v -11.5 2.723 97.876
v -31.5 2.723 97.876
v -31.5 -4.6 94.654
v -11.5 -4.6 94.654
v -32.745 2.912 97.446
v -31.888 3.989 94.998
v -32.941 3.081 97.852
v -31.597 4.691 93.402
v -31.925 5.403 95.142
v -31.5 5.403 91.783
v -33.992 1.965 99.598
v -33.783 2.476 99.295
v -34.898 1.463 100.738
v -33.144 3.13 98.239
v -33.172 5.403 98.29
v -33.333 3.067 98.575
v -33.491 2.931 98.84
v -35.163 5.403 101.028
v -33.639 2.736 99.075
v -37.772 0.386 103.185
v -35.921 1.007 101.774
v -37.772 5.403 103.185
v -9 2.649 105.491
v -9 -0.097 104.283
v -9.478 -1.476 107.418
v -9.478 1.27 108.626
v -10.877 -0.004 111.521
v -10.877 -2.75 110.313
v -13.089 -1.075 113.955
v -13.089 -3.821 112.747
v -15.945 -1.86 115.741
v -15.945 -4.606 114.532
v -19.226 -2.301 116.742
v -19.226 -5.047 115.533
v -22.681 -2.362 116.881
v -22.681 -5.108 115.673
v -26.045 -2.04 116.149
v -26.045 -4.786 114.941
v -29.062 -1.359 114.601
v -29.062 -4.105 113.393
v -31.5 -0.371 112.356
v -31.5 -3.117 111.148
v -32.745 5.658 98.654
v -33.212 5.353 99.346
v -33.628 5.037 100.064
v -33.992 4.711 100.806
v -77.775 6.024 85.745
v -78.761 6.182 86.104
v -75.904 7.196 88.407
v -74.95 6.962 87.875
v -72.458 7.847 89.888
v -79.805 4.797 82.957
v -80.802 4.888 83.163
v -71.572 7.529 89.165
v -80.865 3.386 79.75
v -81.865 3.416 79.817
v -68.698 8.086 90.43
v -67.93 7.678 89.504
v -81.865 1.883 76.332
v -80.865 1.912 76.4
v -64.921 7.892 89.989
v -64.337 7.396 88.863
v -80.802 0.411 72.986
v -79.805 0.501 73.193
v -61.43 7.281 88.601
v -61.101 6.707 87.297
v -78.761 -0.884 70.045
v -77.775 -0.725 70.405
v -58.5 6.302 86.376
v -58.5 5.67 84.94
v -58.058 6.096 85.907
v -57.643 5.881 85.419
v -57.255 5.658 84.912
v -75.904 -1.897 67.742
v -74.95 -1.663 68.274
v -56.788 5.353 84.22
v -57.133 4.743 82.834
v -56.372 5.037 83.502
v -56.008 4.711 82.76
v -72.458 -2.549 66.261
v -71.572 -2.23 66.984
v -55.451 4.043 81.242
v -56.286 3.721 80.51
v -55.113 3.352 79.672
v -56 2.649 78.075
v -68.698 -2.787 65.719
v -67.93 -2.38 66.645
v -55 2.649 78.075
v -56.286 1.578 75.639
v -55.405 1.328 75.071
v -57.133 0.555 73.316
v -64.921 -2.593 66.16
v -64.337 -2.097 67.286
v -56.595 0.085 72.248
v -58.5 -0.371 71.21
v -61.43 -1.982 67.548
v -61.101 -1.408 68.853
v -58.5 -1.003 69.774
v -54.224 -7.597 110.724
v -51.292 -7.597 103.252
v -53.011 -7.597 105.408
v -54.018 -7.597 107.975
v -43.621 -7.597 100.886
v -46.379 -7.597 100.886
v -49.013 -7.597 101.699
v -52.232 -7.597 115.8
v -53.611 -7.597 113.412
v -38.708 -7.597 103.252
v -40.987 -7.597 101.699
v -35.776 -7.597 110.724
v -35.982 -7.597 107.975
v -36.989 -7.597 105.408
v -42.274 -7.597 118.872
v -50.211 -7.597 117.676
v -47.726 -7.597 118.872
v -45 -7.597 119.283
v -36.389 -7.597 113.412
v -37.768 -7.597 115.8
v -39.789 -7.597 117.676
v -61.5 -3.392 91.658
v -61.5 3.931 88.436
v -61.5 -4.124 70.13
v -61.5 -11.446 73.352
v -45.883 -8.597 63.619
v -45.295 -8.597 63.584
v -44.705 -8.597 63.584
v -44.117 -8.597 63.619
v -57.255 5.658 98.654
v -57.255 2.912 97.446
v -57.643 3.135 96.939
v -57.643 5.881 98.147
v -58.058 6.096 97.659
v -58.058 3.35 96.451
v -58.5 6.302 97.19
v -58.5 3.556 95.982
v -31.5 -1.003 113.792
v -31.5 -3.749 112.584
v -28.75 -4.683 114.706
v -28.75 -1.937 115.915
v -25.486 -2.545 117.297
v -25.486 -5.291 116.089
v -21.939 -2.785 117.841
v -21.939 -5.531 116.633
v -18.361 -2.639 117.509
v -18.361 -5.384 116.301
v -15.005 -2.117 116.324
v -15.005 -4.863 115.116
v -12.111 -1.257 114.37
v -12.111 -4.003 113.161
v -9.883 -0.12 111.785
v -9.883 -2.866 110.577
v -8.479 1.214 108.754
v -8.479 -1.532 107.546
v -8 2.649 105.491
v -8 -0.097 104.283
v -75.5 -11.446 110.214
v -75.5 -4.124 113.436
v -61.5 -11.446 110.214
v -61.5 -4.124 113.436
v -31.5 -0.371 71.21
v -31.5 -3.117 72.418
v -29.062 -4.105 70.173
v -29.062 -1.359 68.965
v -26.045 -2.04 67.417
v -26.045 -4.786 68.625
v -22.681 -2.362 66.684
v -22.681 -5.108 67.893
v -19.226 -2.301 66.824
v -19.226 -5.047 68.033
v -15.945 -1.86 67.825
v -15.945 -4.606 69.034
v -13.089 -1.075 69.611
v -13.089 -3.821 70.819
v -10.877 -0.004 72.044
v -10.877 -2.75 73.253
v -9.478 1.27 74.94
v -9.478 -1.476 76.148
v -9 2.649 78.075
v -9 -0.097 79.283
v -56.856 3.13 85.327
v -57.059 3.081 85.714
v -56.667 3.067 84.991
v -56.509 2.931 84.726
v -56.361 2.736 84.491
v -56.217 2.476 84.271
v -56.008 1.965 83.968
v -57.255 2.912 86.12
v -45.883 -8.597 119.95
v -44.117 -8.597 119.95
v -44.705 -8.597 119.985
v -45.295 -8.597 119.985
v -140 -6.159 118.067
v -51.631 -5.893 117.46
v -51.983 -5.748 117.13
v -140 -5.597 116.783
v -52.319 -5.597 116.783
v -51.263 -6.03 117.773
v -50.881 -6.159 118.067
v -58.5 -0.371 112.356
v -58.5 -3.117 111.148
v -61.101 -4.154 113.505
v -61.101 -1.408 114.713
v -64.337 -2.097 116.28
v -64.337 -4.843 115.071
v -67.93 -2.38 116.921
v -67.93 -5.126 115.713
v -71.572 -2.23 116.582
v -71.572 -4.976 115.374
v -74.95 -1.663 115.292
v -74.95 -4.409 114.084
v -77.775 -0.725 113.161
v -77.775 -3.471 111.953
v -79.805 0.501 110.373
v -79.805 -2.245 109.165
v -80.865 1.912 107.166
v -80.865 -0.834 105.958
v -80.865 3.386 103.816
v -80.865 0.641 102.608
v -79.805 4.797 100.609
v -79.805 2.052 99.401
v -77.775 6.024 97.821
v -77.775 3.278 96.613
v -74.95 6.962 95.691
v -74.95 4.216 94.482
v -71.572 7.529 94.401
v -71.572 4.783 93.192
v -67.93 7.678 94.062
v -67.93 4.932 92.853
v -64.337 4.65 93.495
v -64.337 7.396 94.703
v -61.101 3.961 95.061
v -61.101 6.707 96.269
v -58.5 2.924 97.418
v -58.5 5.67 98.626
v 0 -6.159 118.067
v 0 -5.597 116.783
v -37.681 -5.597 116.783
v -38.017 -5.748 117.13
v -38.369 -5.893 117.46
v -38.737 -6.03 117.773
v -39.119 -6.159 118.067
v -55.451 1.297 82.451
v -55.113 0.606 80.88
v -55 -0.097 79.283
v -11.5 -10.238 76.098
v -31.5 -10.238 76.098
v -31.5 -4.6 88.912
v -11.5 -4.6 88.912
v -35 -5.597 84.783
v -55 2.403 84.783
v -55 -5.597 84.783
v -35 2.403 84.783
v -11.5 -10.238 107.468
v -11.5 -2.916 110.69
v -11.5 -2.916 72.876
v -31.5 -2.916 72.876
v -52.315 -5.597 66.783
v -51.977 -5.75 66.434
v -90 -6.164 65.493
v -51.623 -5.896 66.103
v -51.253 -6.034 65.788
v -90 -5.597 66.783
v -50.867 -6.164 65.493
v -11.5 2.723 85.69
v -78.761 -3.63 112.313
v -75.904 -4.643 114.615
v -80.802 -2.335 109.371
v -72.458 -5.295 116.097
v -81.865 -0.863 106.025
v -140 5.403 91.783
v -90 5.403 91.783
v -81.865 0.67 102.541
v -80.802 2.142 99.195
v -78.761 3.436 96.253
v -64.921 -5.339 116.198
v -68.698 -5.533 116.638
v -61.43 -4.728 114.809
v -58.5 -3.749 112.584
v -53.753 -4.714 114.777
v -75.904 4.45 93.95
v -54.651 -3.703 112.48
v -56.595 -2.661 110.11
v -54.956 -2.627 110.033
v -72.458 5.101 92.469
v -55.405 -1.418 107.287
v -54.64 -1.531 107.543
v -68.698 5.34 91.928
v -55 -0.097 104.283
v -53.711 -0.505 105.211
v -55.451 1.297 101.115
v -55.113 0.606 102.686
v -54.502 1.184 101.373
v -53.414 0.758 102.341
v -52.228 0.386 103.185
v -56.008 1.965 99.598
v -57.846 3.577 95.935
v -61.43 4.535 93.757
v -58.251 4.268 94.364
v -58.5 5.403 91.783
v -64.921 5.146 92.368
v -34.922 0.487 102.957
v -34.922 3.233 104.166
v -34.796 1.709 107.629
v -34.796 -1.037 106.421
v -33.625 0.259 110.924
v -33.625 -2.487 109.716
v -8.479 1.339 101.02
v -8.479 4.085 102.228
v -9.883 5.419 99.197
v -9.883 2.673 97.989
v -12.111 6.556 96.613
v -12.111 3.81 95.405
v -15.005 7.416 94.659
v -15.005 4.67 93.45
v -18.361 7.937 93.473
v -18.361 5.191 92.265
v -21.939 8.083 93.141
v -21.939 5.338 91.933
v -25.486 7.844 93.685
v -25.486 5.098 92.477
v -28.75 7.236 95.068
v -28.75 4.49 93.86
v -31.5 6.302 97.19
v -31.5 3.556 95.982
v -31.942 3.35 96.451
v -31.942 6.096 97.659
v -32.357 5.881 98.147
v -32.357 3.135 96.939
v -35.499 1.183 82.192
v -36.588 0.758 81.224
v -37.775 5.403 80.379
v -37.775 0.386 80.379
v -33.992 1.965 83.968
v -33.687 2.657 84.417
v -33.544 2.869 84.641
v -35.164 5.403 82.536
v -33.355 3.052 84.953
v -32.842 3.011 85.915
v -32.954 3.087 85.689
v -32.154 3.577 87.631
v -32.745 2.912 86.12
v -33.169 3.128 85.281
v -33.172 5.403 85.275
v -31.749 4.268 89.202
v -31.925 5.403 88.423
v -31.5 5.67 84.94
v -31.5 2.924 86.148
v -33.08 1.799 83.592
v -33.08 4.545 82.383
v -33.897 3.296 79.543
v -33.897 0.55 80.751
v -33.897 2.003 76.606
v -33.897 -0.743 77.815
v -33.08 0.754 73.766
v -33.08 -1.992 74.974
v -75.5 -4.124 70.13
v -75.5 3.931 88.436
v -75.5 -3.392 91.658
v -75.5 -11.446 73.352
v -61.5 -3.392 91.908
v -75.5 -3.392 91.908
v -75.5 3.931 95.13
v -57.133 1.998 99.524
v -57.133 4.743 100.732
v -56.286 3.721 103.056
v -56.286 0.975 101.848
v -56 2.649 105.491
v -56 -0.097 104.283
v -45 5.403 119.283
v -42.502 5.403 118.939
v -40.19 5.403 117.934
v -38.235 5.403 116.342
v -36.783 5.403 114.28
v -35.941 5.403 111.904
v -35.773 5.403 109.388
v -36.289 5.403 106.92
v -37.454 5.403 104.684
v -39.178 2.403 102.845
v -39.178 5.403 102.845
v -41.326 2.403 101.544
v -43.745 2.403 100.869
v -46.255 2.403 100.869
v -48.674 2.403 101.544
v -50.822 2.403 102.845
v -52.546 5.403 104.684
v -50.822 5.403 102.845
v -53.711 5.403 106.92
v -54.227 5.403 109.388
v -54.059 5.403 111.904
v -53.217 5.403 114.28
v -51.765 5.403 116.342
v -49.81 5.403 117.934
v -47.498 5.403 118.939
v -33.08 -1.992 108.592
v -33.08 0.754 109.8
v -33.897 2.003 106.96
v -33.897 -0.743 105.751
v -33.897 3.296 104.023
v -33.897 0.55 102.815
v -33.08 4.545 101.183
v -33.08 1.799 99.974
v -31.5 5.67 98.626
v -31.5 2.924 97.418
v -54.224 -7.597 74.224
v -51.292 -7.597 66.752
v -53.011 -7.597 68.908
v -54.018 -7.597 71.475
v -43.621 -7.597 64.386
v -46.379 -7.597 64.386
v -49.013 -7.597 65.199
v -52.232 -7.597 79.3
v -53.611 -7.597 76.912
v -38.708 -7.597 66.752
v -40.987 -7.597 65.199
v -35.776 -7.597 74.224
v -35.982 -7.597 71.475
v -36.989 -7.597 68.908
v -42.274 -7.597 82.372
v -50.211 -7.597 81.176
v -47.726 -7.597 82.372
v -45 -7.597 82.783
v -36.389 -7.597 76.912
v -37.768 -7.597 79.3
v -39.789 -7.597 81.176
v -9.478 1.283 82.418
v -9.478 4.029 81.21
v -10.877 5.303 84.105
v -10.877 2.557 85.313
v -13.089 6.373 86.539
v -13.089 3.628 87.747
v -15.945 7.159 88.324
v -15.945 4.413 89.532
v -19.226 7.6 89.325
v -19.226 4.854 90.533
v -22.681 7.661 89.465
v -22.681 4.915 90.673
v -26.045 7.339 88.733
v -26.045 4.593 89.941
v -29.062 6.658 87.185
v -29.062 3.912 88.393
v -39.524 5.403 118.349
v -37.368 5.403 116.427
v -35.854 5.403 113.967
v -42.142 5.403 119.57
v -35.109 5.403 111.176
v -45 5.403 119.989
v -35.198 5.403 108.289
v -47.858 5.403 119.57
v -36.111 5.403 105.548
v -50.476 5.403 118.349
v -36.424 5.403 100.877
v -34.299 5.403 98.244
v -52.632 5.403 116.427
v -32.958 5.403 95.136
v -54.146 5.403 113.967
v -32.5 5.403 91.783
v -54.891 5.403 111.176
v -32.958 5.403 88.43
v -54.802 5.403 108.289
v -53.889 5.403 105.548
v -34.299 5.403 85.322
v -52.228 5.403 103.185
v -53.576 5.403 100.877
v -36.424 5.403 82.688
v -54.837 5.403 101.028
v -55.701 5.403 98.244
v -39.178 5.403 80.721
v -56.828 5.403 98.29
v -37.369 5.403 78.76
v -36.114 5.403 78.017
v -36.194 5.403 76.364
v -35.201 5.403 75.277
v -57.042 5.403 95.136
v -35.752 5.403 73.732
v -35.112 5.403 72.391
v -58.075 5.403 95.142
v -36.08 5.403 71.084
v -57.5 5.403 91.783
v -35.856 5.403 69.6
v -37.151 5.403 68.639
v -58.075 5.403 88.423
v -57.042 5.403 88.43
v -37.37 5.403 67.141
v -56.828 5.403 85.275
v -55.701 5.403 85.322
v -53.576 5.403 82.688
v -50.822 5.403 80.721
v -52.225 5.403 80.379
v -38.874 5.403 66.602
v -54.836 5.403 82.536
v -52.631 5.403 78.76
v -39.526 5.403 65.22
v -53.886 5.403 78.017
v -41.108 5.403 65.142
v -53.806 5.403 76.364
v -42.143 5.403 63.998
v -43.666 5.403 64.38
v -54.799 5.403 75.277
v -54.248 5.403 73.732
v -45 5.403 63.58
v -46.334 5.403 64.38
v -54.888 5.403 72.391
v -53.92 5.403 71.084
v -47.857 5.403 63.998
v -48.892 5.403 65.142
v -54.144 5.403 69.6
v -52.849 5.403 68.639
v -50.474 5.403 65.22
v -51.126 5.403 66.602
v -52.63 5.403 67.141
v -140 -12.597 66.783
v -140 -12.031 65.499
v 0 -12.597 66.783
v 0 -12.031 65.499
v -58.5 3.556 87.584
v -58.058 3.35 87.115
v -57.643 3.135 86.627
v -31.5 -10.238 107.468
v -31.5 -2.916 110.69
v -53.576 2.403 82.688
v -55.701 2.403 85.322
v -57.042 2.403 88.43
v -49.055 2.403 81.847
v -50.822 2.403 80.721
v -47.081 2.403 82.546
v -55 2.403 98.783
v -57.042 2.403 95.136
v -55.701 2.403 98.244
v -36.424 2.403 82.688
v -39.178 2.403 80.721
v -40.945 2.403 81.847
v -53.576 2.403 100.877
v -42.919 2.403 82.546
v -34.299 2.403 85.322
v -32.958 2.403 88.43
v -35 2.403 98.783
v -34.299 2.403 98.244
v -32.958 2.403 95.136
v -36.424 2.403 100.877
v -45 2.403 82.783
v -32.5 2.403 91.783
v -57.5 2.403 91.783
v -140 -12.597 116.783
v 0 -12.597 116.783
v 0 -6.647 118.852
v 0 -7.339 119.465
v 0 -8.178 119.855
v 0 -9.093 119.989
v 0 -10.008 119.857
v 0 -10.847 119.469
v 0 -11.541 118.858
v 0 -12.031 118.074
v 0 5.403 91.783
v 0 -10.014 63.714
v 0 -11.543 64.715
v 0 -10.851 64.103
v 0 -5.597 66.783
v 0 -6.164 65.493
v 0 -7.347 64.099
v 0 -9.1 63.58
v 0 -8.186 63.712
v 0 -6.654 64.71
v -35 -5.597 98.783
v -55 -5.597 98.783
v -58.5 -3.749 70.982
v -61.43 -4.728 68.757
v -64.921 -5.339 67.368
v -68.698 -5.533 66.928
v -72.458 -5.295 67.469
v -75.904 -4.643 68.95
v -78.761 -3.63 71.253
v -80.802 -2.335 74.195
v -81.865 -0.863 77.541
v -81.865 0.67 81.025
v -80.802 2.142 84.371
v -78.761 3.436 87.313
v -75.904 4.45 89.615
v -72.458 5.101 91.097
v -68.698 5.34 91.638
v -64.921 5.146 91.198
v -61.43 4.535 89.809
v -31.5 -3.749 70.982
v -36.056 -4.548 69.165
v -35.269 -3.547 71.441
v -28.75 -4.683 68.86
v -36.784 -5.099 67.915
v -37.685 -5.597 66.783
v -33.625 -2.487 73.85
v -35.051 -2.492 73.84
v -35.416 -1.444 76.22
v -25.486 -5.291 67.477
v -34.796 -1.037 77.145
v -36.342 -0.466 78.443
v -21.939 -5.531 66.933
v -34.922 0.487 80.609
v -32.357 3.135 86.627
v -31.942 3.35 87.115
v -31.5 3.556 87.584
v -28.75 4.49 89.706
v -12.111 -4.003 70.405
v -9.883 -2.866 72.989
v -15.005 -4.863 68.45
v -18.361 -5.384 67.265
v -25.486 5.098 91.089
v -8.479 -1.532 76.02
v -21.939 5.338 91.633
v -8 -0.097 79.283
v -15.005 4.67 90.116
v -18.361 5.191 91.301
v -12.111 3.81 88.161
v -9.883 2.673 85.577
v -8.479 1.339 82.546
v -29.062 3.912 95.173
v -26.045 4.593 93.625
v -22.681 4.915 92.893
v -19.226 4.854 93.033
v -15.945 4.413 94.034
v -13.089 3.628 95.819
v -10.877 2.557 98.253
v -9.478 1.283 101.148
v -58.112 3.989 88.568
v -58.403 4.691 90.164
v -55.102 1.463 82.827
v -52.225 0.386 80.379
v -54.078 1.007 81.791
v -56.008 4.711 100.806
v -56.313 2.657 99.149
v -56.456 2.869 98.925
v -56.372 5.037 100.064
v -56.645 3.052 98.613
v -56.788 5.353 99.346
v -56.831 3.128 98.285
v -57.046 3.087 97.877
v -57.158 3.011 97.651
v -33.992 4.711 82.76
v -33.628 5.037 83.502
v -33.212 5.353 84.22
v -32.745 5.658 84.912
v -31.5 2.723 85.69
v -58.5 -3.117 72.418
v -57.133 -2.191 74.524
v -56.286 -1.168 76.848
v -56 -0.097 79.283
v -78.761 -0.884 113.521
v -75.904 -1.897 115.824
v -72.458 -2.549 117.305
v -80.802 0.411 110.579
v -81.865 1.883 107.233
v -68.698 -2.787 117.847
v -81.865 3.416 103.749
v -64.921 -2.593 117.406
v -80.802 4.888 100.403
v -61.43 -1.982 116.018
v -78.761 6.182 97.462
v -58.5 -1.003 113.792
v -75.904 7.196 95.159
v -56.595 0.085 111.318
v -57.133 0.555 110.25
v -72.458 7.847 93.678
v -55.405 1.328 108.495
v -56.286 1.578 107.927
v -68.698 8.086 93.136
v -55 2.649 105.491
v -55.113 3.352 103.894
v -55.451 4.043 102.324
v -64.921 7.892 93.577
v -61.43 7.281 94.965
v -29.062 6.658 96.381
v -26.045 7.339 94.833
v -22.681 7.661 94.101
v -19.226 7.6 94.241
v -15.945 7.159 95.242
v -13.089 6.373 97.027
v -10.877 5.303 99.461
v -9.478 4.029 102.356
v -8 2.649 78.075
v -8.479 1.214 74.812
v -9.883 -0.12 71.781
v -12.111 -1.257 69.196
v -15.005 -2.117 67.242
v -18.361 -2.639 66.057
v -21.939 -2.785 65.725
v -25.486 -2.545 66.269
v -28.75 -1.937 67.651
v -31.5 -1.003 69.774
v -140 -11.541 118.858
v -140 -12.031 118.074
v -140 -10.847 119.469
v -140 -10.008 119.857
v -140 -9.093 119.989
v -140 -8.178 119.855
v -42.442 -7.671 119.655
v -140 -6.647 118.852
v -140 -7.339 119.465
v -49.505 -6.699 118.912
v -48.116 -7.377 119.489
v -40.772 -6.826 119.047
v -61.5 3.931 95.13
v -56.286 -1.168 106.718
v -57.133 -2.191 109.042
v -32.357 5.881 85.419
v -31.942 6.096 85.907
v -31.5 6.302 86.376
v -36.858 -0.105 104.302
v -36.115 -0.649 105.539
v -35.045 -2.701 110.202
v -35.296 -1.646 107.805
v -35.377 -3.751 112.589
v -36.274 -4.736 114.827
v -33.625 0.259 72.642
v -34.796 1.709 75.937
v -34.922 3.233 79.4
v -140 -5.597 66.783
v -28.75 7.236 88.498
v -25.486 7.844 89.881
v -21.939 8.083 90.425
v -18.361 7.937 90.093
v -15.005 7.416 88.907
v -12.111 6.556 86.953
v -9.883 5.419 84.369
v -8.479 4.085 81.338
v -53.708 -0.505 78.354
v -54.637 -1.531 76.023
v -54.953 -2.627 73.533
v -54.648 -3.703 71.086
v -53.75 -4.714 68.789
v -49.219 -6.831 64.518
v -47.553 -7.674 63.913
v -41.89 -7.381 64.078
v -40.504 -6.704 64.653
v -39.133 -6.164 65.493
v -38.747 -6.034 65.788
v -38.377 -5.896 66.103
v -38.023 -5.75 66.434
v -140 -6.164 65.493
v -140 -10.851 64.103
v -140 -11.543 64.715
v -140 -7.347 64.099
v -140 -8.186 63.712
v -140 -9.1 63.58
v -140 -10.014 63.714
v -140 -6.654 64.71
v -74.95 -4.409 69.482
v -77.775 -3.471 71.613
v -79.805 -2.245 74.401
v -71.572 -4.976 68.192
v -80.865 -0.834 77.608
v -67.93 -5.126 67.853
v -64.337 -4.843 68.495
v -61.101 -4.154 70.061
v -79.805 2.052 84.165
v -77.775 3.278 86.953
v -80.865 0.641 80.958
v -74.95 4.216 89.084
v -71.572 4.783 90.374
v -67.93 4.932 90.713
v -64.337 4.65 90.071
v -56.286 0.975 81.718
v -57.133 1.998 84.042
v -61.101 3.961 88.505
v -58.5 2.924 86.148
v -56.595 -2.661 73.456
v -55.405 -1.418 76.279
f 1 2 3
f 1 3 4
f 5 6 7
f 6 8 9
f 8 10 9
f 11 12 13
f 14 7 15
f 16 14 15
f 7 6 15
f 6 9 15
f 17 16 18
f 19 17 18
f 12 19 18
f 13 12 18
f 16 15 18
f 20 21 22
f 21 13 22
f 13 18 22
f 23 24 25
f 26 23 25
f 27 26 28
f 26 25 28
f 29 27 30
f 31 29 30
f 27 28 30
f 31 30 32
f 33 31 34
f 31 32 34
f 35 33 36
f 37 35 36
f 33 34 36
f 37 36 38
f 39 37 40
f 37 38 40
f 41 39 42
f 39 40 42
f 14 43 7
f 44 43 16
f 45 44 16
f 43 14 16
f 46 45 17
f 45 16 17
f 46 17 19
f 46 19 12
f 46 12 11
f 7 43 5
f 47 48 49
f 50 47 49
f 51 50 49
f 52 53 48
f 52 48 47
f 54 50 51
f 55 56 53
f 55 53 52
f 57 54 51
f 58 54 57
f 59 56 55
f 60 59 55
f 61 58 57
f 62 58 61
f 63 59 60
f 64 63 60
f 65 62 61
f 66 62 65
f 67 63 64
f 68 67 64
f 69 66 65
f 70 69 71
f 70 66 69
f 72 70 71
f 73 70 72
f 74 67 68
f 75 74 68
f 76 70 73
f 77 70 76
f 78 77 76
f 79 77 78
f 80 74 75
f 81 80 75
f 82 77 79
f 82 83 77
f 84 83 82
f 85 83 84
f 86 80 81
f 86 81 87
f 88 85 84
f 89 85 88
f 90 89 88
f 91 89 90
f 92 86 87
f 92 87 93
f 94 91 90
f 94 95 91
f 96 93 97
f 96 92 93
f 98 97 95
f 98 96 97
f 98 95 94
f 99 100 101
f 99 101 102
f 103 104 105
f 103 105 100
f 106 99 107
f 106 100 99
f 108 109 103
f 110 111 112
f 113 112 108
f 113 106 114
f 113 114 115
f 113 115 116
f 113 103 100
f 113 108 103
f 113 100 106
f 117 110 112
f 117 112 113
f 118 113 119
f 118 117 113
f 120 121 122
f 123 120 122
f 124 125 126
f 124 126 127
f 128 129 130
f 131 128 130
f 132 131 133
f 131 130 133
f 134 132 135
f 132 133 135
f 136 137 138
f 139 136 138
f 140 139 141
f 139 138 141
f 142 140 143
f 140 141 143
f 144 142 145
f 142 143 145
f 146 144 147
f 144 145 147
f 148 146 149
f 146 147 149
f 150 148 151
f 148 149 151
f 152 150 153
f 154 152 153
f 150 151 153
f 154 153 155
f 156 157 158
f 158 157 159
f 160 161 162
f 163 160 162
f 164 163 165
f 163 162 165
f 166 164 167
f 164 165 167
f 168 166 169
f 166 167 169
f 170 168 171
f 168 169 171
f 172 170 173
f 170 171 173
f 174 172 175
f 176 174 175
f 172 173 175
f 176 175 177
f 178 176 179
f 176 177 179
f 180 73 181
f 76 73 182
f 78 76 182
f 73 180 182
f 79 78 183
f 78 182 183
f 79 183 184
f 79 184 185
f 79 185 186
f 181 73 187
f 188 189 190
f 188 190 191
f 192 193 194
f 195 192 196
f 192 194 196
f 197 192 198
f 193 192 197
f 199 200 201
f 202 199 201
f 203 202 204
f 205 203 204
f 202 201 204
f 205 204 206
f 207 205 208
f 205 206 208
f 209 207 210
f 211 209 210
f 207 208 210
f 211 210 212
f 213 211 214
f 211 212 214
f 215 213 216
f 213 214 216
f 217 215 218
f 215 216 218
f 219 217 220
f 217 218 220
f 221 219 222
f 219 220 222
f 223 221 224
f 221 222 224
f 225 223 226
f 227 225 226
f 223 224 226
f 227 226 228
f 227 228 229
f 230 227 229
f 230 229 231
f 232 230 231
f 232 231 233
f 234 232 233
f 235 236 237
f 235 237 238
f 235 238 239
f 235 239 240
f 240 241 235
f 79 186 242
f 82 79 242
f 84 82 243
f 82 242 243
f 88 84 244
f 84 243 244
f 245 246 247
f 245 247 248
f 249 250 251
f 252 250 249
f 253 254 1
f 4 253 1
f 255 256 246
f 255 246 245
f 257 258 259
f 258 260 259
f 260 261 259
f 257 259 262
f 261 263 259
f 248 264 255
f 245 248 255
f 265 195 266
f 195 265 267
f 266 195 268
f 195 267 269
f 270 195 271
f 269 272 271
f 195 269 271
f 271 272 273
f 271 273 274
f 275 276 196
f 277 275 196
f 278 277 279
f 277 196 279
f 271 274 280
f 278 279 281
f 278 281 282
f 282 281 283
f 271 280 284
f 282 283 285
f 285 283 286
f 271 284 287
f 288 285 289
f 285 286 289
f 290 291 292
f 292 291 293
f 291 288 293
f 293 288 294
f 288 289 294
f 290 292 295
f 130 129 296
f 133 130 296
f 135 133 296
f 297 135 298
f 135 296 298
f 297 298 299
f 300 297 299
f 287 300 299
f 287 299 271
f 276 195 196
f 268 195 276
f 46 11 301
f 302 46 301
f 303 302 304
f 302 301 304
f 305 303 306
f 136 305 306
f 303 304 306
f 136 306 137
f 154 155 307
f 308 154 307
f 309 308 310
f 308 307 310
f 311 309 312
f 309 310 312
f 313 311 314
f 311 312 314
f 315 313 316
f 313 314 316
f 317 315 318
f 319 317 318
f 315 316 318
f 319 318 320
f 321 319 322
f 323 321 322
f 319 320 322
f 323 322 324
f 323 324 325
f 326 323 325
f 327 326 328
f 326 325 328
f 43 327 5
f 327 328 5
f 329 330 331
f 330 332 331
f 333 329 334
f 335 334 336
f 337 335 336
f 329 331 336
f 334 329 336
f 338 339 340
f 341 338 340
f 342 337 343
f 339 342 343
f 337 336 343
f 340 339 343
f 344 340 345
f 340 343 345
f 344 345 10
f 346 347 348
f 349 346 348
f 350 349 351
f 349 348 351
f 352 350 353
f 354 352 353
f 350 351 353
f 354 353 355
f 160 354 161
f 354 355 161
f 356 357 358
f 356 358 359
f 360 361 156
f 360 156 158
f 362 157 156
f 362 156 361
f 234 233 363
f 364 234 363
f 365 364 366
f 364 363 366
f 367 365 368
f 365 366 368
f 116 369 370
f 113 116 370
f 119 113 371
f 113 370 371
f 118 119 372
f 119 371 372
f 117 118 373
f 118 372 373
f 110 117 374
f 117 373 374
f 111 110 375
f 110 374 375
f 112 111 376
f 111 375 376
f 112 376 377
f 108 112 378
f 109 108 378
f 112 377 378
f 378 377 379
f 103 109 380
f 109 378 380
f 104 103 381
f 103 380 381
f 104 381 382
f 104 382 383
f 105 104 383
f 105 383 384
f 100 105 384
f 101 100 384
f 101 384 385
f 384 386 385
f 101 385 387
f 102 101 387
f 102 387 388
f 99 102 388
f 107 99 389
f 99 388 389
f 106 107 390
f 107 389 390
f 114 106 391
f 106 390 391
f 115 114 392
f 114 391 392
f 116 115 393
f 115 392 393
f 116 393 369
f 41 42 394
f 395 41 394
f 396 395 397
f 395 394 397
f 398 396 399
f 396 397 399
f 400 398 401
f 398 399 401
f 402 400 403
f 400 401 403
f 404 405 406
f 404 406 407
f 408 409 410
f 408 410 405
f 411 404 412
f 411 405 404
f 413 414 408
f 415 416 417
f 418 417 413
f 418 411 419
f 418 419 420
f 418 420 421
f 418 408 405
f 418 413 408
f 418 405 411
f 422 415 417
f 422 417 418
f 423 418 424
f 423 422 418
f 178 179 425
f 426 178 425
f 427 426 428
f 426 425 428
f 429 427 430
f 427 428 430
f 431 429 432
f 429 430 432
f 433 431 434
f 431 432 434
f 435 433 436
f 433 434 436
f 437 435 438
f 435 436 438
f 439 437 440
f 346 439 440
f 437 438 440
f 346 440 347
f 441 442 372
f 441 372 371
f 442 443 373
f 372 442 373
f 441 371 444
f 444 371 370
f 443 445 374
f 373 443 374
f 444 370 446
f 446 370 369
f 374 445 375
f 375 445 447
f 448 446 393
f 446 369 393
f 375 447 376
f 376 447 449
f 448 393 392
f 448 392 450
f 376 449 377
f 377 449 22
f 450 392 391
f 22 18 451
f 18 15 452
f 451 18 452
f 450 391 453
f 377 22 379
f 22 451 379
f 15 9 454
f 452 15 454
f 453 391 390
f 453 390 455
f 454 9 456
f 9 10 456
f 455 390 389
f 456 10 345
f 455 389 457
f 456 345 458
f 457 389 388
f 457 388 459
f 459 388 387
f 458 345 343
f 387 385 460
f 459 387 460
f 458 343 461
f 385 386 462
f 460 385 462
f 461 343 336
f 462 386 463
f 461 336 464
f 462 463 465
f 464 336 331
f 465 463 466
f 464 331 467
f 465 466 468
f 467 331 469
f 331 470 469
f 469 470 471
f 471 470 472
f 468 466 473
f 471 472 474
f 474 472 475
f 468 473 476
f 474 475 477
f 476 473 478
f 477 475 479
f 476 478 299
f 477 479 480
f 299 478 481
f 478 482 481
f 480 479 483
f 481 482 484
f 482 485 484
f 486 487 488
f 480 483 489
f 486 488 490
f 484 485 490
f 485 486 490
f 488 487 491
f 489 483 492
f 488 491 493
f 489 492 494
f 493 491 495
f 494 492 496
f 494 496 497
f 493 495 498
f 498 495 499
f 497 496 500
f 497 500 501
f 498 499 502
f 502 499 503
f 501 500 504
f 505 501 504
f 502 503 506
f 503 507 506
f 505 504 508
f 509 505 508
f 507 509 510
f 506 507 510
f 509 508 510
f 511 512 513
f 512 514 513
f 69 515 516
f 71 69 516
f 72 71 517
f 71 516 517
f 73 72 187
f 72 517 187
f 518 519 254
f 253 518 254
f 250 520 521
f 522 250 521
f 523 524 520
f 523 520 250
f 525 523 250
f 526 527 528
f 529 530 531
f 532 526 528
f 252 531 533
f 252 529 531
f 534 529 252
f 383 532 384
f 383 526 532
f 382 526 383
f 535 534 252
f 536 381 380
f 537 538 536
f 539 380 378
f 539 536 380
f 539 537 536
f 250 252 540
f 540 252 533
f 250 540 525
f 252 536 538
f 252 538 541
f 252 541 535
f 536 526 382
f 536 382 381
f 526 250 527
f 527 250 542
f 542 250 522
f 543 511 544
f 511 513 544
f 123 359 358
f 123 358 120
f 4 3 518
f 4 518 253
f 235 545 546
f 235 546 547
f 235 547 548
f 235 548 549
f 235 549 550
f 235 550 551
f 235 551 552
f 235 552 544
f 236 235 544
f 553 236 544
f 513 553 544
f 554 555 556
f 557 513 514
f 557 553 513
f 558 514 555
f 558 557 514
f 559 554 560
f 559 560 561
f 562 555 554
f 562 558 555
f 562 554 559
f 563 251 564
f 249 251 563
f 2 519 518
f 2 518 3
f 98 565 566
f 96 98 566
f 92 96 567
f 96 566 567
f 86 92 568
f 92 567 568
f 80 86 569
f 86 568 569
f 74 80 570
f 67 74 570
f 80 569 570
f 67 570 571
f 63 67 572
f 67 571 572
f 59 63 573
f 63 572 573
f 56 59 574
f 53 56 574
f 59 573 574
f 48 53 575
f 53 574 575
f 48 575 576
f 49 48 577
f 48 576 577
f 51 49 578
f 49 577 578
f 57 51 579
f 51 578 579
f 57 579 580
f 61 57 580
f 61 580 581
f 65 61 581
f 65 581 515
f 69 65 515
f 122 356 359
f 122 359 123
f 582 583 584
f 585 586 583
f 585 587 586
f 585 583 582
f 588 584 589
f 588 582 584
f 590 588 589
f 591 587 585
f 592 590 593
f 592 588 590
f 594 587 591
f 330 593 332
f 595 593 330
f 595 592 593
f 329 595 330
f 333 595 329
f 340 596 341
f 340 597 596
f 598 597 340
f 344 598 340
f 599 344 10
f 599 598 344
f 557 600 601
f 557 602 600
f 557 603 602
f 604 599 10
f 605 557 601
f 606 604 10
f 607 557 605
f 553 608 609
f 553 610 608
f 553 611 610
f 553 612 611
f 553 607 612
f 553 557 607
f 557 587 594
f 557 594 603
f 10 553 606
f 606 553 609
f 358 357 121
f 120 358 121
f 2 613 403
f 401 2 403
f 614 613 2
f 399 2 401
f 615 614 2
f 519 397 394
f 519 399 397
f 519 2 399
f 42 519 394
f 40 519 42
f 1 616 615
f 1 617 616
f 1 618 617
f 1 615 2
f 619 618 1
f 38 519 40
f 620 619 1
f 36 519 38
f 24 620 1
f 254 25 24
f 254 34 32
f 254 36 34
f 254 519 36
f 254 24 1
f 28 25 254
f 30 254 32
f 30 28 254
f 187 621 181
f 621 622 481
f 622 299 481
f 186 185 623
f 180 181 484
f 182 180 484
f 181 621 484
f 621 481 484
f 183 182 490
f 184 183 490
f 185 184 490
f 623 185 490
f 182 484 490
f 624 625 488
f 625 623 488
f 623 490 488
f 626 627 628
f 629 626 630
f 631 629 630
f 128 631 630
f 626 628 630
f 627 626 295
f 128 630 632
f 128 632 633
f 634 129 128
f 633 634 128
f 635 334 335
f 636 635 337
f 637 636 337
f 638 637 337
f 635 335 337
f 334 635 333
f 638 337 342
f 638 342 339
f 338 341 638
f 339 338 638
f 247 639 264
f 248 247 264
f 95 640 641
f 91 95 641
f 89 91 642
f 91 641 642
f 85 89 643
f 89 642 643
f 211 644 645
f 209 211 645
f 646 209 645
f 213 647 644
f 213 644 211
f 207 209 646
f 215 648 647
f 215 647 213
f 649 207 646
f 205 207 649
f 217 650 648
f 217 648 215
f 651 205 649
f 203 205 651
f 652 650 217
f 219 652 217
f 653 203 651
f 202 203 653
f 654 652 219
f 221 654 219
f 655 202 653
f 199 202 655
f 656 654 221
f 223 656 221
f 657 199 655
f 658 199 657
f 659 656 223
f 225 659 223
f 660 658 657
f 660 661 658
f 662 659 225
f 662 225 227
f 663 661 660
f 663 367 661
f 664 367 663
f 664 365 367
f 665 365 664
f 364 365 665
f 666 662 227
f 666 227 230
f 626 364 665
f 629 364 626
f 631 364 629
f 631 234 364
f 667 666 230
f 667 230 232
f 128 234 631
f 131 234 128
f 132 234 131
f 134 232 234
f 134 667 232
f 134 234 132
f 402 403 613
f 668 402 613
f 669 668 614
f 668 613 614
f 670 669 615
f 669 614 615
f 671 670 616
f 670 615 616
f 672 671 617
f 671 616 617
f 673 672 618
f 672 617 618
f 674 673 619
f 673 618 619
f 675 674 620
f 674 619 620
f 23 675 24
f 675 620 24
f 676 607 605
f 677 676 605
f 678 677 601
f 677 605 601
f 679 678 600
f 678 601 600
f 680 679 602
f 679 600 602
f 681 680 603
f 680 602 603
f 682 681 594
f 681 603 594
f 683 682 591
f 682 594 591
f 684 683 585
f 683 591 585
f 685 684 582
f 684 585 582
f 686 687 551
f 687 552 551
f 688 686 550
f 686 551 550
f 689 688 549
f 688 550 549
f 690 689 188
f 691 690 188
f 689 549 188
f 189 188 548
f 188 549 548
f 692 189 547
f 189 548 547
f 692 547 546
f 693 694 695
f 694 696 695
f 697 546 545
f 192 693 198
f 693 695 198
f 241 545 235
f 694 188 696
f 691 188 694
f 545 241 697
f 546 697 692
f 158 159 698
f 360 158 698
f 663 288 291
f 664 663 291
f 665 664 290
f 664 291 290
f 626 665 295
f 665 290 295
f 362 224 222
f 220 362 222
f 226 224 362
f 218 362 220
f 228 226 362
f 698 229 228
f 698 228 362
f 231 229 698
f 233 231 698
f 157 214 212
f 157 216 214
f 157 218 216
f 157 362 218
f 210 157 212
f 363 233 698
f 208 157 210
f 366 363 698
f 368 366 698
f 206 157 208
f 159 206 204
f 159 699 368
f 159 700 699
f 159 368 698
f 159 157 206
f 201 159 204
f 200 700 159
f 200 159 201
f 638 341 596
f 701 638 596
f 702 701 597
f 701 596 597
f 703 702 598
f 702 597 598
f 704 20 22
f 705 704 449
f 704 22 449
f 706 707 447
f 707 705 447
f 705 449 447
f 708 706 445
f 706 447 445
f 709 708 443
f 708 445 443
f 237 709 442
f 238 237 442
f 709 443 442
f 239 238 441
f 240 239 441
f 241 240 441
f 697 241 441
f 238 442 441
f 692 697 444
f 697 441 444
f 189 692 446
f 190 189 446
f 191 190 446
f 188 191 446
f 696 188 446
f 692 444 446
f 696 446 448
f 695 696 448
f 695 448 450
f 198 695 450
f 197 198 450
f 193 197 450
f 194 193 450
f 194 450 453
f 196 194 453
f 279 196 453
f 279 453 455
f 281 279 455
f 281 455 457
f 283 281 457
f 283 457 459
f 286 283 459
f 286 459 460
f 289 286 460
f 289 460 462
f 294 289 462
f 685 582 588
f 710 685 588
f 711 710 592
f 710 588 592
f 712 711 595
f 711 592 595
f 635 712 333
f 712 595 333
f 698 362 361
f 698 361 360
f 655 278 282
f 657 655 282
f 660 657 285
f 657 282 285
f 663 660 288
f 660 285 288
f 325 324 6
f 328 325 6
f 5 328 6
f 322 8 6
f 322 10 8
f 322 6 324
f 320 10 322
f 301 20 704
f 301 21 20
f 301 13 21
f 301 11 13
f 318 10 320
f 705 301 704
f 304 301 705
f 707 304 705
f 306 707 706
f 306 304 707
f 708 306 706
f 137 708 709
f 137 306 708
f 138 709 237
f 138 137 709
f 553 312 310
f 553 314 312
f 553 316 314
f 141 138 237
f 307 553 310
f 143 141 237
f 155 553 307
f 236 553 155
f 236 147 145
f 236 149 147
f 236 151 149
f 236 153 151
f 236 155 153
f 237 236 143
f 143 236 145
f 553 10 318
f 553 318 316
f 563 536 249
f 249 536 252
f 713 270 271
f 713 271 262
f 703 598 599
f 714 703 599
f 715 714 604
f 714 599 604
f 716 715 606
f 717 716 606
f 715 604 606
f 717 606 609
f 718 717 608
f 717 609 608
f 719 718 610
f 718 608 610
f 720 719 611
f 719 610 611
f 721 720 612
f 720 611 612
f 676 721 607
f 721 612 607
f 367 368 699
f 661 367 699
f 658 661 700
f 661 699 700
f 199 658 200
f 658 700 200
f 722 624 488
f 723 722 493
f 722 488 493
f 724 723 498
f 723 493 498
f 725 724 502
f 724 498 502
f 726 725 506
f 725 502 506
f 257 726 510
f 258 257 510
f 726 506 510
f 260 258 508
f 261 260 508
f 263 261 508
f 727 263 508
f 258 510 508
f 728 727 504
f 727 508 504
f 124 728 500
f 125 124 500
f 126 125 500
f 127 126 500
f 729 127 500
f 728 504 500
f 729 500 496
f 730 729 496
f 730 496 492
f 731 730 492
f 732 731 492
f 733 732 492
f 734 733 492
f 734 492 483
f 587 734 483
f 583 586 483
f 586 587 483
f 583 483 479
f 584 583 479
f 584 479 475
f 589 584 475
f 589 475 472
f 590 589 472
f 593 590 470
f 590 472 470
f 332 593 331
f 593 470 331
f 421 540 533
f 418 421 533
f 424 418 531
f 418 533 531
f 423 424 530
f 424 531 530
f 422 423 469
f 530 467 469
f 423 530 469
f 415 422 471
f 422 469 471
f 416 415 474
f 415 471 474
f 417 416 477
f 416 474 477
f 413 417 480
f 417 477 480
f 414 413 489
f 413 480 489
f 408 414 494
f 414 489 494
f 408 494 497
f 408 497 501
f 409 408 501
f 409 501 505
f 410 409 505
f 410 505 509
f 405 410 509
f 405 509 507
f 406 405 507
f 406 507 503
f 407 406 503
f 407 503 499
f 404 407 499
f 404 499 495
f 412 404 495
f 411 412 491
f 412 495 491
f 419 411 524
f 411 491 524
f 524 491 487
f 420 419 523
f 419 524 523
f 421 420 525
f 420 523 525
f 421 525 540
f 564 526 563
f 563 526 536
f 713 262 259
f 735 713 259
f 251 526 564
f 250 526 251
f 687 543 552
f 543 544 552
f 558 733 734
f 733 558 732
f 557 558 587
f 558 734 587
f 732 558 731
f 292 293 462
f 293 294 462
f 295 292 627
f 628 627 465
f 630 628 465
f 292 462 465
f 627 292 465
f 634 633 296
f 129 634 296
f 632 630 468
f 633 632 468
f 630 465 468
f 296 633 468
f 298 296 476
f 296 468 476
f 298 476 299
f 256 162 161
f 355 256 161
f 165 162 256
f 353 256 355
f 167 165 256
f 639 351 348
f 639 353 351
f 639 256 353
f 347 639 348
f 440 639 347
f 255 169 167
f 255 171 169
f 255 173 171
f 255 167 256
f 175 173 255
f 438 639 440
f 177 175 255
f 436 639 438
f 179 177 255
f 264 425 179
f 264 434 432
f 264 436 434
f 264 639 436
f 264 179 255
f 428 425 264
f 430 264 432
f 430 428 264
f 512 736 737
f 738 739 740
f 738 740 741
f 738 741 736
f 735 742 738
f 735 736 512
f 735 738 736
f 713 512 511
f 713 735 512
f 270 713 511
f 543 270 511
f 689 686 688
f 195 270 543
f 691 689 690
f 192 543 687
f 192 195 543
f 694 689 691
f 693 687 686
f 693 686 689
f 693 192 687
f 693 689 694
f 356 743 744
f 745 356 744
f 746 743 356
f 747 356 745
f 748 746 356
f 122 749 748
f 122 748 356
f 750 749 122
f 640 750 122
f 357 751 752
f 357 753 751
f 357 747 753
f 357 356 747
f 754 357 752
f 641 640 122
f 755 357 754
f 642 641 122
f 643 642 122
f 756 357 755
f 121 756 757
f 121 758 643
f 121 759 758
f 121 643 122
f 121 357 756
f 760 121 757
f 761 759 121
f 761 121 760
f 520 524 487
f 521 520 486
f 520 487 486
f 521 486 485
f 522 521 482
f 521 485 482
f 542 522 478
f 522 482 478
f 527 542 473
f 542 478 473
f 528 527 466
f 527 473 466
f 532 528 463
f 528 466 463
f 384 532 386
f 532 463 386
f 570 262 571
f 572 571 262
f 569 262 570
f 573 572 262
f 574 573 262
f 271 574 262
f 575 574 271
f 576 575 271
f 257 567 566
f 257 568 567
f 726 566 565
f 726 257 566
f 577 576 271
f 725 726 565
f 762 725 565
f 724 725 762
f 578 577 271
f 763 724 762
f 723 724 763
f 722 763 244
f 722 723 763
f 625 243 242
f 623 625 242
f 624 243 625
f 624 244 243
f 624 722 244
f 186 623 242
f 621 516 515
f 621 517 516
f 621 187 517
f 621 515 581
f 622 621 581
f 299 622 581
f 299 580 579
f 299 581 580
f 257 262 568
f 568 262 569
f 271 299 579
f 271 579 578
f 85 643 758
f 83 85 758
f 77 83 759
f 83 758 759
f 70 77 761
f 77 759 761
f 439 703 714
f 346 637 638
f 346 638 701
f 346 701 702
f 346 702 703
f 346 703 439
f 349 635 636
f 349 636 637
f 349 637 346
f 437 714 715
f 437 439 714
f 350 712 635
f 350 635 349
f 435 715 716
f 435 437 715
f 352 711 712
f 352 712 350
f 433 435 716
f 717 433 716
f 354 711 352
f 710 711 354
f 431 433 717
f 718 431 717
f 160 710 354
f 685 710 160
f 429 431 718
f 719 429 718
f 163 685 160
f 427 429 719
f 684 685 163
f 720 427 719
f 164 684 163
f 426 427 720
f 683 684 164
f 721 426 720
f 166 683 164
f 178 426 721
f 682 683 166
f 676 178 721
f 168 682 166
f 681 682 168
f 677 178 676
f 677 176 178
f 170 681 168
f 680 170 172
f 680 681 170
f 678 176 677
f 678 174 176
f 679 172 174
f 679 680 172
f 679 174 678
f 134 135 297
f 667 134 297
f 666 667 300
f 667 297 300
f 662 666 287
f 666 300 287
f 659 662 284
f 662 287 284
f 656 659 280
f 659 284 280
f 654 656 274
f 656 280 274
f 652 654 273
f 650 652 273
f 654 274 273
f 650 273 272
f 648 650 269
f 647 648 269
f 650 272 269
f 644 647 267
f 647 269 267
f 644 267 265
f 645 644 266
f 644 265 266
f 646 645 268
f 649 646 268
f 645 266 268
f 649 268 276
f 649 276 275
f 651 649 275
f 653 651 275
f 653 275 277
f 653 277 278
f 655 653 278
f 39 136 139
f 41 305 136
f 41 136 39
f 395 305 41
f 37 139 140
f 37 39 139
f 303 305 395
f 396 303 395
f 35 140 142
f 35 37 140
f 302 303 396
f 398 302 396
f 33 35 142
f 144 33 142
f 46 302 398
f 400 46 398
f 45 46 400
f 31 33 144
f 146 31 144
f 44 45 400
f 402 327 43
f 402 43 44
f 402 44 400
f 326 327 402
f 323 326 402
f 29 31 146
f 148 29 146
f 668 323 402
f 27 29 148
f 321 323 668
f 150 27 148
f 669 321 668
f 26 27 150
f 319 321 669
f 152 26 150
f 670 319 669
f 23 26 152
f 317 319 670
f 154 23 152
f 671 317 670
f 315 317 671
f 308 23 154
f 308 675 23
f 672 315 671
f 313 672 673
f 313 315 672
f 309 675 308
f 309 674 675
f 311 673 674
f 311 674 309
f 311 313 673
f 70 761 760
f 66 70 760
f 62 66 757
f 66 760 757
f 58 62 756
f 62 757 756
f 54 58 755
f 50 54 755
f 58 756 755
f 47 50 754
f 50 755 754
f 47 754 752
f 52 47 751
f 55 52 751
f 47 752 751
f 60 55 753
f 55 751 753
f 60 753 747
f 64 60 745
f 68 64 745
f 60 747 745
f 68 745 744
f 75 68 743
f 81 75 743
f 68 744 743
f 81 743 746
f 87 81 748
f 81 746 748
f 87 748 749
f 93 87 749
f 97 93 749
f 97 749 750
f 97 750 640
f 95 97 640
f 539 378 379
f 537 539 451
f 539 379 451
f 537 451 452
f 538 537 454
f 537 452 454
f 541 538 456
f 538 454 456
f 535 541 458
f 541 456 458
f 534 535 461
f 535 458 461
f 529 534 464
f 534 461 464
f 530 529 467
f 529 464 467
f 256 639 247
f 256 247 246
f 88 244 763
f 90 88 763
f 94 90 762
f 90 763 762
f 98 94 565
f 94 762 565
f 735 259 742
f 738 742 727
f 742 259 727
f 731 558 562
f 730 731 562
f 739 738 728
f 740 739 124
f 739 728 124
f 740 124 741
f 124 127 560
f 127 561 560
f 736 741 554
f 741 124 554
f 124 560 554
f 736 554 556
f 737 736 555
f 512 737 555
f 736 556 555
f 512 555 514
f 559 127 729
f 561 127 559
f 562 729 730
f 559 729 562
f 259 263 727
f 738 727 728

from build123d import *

# Parameters (mm, degrees)
SKETCH1_W            = 50
SKETCH1_H            = 7
BOSS_EXTRUDE1_DEPTH  = 90
SKETCH2_R            = 13.5
BOSS_EXTRUDE2_DEPTH  = 8
BOSS_EXTRUDE3_DEPTH  = 3
BOSS_EXTRUDE4_DEPTH  = 3
SKETCH5_R            = 12.5
CUT_EXTRUDE1_DEPTH   = 3
SKETCH6_W            = 20
SKETCH6_H            = 14
SKETCH6_W_2          = 14
SKETCH6_H_2          = 20
CUT_EXTRUDE3_DEPTH   = 8
SKETCH7_W            = 20
SKETCH7_H            = 14
SKETCH7_W_2          = 14
SKETCH7_H_2          = 20
CUT_EXTRUDE4_DEPTH   = 8
SKETCH8_W            = 20
SKETCH8_H            = 14
CUT_EXTRUDE5_DEPTH   = 8
BOSS_EXTRUDE6_START  = -90
BOSS_EXTRUDE6_DEPTH  = 90
SKETCH12_R           = 9.956392443
SKETCH12_R_2         = 9.25
SKETCH12_R_3         = 9.953463084
BOSS_EXTRUDE7_DEPTH  = 14
SKETCH13_R           = 12.5
CUT_EXTRUDE6_DEPTH   = 3
SKETCH14_R           = 9.25
BOSS_EXTRUDE8_DEPTH  = 13
SKETCH15_R           = 9.25
CUT_EXTRUDE7_DEPTH   = 13
BOSS_EXTRUDE11_DEPTH = 50


with BuildPart() as part:
    # Sketch1 → Boss-Extrude1 (new body)
    with BuildSketch(Plane(origin=(0, 0, 0), x_dir=(0, 0, -1), z_dir=(1, 0, 0))):
        Polygon((-91.782967909, 5.403450034), (-91.782967909, -5.596549966), (-66.782967909, -5.596549966), align=None)
        with Locations((-91.782967909, -9.096549966)):
            Rectangle(SKETCH1_W, SKETCH1_H)
        Polygon((-116.782967909, -5.596549966), (-91.782967909, -5.596549966), (-91.782967909, 5.403450034), align=None)
    extrude(amount=-BOSS_EXTRUDE1_DEPTH)

    # Sketch2 → Boss-Extrude2 (add)
    with BuildSketch(Plane(origin=(0, 5.403450034, 0), x_dir=(-1, 0, 0), z_dir=(0, -1, 0))):
        with Locations((45, -91.782967909)):
            Circle(SKETCH2_R)
    extrude(amount=BOSS_EXTRUDE2_DEPTH)

    # Sketch3 → Boss-Extrude3 (add)
    with BuildSketch(Plane(origin=(0, 38.361223118, 16.878938172), x_dir=(1, 0, 0), z_dir=(0, 0.9153150324227656, 0.402738614266017))):
        with BuildLine():
            Line((-58.5, -87.990652552), (-58.5, -86.421473978))
            ThreePointArc((-58.5, -86.421473978), (-82, -95.490652552), (-58.5, -104.559831125))
            Line((-58.5, -104.559831125), (-58.5, -102.990652552))
            ThreePointArc((-58.5, -102.990652552), (-81, -95.490652552), (-58.5, -87.990652552))
        make_face()
        with BuildLine():
            ThreePointArc((-57.25492495, -88.020827445), (-57.847404713, -87.19775115), (-58.5, -86.421473978))
            Line((-58.5, -86.421473978), (-58.5, -87.990652552))
            ThreePointArc((-58.5, -87.990652552), (-56.641458774, -91.537805477), (-56, -95.490652552))
            ThreePointArc((-56, -95.490652552), (-56.641458774, -99.443499627), (-58.5, -102.990652552))
            Line((-58.5, -102.990652552), (-58.5, -104.559831125))
            ThreePointArc((-58.5, -104.559831125), (-55.905358282, -100.351208076), (-55, -95.490652552))
            ThreePointArc((-55, -95.490652552), (-55.254365648, -92.882363724), (-56.007877127, -90.37236513))
            add(Edge.make_bspline(
                [(-57.25492495, -88.020827445), (-56.730976667, -89.259625667), (-56.007877127, -90.37236513)],
                knots=[2.018456538, 2.018456538, 2.018456538, 2.19652694, 2.19652694, 2.19652694], degree=2, weights=[0.880634053, 0.866355929, 0.859605864]))
        make_face()
        with BuildLine():
            ThreePointArc((-56.007877127, -90.37236513), (-56.573304159, -89.165786836), (-57.25492495, -88.020827445))
            add(Edge.make_bspline(
                [(-57.25492495, -88.020827445), (-56.730976667, -89.259625667), (-56.007877127, -90.37236513)],
                knots=[2.018456538, 2.018456538, 2.018456538, 2.19652694, 2.19652694, 2.19652694], degree=2, weights=[0.880634053, 0.866355929, 0.859605864]))
        make_face()
        with BuildLine():
            ThreePointArc((-8, -95.490652552), (-16.639444476, -82.896010834), (-31.5, -86.421473978))
            Line((-31.5, -86.421473978), (-31.5, -87.990652552))
            ThreePointArc((-31.5, -87.990652552), (-17.547152925, -83.632111326), (-9, -95.490652552))
            ThreePointArc((-9, -95.490652552), (-17.547152925, -107.349193777), (-31.5, -102.990652552))
            Line((-31.5, -102.990652552), (-31.5, -104.559831125))
            ThreePointArc((-31.5, -104.559831125), (-16.639444476, -108.08529427), (-8, -95.490652552))
        make_face()
        with BuildLine():
            Line((-31.5, -87.990652552), (-31.5, -86.421473978))
            ThreePointArc((-31.5, -86.421473978), (-32.152595287, -87.19775115), (-32.74507505, -88.020827445))
            add(Edge.make_bspline(
                [(-33.992122873, -90.37236513), (-33.269023333, -89.259625667), (-32.74507505, -88.020827445)],
                knots=[4.086658367, 4.086658367, 4.086658367, 4.264728769, 4.264728769, 4.264728769], degree=2, weights=[0.859605864, 0.866355929, 0.880634053]))
            ThreePointArc((-33.992122873, -90.37236513), (-34.796426049, -97.826258325), (-31.5, -104.559831125))
            Line((-31.5, -104.559831125), (-31.5, -102.990652552))
            ThreePointArc((-31.5, -102.990652552), (-34, -95.490652552), (-31.5, -87.990652552))
        make_face()
        with BuildLine():
            add(Edge.make_bspline(
                [(-33.992122873, -90.37236513), (-33.269023333, -89.259625667), (-32.74507505, -88.020827445)],
                knots=[4.086658367, 4.086658367, 4.086658367, 4.264728769, 4.264728769, 4.264728769], degree=2, weights=[0.859605864, 0.866355929, 0.880634053]))
            ThreePointArc((-32.74507505, -88.020827445), (-33.426695841, -89.165786836), (-33.992122873, -90.37236513))
        make_face()
    extrude(amount=BOSS_EXTRUDE3_DEPTH)

    # Sketch4 → Boss-Extrude4 (add)
    with BuildSketch(Plane(origin=(0, -29.307184857, 12.895161337), x_dir=(1, 0, 0), z_dir=(0, 0.9153150324227658, -0.4027386142660168))):
        with BuildLine():
            ThreePointArc((-58.5, -63.460829369), (-82, -72.530007942), (-58.5, -81.599186516))
            Line((-58.5, -81.599186516), (-58.5, -80.030007942))
            ThreePointArc((-58.5, -80.030007942), (-81, -72.530007942), (-58.5, -65.030007942))
            Line((-58.5, -65.030007942), (-58.5, -63.460829369))
        make_face()
        with BuildLine():
            add(Edge.make_bspline(
                [(-56.007877127, -77.648295364), (-56.730976667, -78.761034827), (-57.25492495, -79.999833049)],
                knots=[4.086658367, 4.086658367, 4.086658367, 4.264728769, 4.264728769, 4.264728769], degree=2, weights=[0.859605864, 0.866355929, 0.880634053]))
            ThreePointArc((-56.007877127, -77.648295364), (-55.254365648, -75.13829677), (-55, -72.530007942))
            ThreePointArc((-55, -72.530007942), (-55.905358282, -67.669452418), (-58.5, -63.460829369))
            Line((-58.5, -63.460829369), (-58.5, -65.030007942))
            ThreePointArc((-58.5, -65.030007942), (-56.641458774, -68.577160867), (-56, -72.530007942))
            ThreePointArc((-56, -72.530007942), (-56.641458774, -76.482855017), (-58.5, -80.030007942))
            Line((-58.5, -80.030007942), (-58.5, -81.599186516))
            ThreePointArc((-58.5, -81.599186516), (-57.847404713, -80.822909344), (-57.25492495, -79.999833049))
        make_face()
        with BuildLine():
            ThreePointArc((-57.25492495, -79.999833049), (-56.573304159, -78.854873658), (-56.007877127, -77.648295364))
            add(Edge.make_bspline(
                [(-56.007877127, -77.648295364), (-56.730976667, -78.761034827), (-57.25492495, -79.999833049)],
                knots=[4.086658367, 4.086658367, 4.086658367, 4.264728769, 4.264728769, 4.264728769], degree=2, weights=[0.859605864, 0.866355929, 0.880634053]))
        make_face()
        with BuildLine():
            Line((-31.5, -80.030007942), (-31.5, -81.599186516))
            ThreePointArc((-31.5, -81.599186516), (-16.639444476, -85.12464966), (-8, -72.530007942))
            ThreePointArc((-8, -72.530007942), (-16.639444476, -59.935366224), (-31.5, -63.460829369))
            Line((-31.5, -63.460829369), (-31.5, -65.030007942))
            ThreePointArc((-31.5, -65.030007942), (-17.547152925, -60.671466717), (-9, -72.530007942))
            ThreePointArc((-9, -72.530007942), (-17.547152925, -84.388549168), (-31.5, -80.030007942))
        make_face()
        with BuildLine():
            ThreePointArc((-32.74507505, -79.999833049), (-32.152595287, -80.822909344), (-31.5, -81.599186516))
            Line((-31.5, -81.599186516), (-31.5, -80.030007942))
            ThreePointArc((-31.5, -80.030007942), (-34, -72.530007942), (-31.5, -65.030007942))
            Line((-31.5, -65.030007942), (-31.5, -63.460829369))
            ThreePointArc((-31.5, -63.460829369), (-34.796426049, -70.194402169), (-33.992122873, -77.648295364))
            add(Edge.make_bspline(
                [(-32.74507505, -79.999833049), (-33.269023333, -78.761034827), (-33.992122873, -77.648295364)],
                knots=[2.018456538, 2.018456538, 2.018456538, 2.19652694, 2.19652694, 2.19652694], degree=2, weights=[0.880634053, 0.866355929, 0.859605864]))
        make_face()
        with BuildLine():
            ThreePointArc((-33.992122873, -77.648295364), (-33.426695841, -78.854873658), (-32.74507505, -79.999833049))
            add(Edge.make_bspline(
                [(-32.74507505, -79.999833049), (-33.269023333, -78.761034827), (-33.992122873, -77.648295364)],
                knots=[2.018456538, 2.018456538, 2.018456538, 2.19652694, 2.19652694, 2.19652694], degree=2, weights=[0.880634053, 0.866355929, 0.859605864]))
        make_face()
    extrude(amount=BOSS_EXTRUDE4_DEPTH)

    # Sketch5 → Cut-Extrude1 (cut)
    with BuildSketch(Plane(origin=(0, 5.403450034, 0), x_dir=(1, 0, 0), z_dir=(0, 1, 0))):
        with Locations(Location((-45, -91.782967909, 0), (0, 0, 270))):
            Circle(SKETCH5_R)
    extrude(amount=-CUT_EXTRUDE1_DEPTH, mode=Mode.SUBTRACT)

    # Sketch6 → Cut-Extrude3 (cut)
    with BuildSketch(Plane(origin=(0, 38.361223118, 16.878938172), x_dir=(1, 0, 0), z_dir=(0, 0.9153150324227656, 0.402738614266017))):
        with Locations((-21.5, -95.490652552)):
            Rectangle(SKETCH6_W, SKETCH6_H)
        with Locations((-68.5, -95.490652552)):
            Rectangle(SKETCH6_W_2, SKETCH6_H_2)
    extrude(amount=-CUT_EXTRUDE3_DEPTH, mode=Mode.SUBTRACT)

    # Sketch7 → Cut-Extrude4 (cut)
    with BuildSketch(Plane(origin=(0, -29.307184857, 12.895161337), x_dir=(1, 0, 0), z_dir=(0, 0.9153150324227658, -0.4027386142660168))):
        with Locations((-21.5, -72.530007942)):
            Rectangle(SKETCH7_W, SKETCH7_H)
        with Locations((-68.5, -72.530007942)):
            Rectangle(SKETCH7_W_2, SKETCH7_H_2)
    extrude(amount=-CUT_EXTRUDE4_DEPTH, mode=Mode.SUBTRACT)

    # Sketch8 → Cut-Extrude5 (cut)
    with BuildSketch(Plane(origin=(0, 2.403450034, 0), x_dir=(1, 0, 0), z_dir=(0, 1, 0))):
        with Locations((-45, -91.782967909)):
            Rectangle(SKETCH8_W, SKETCH8_H)
    extrude(amount=-CUT_EXTRUDE5_DEPTH, mode=Mode.SUBTRACT)

    # Boss-Extrude6: read off the stored shape, not the designer's step
    # Boss-Extrude6 outline → Boss-Extrude6 (add)
    with BuildSketch(Plane(origin=(0, 0, 0), x_dir=(0, 0, -1), z_dir=(1, 0, 0)).offset(BOSS_EXTRUDE6_START)):
        with BuildLine():
            Line((-116.782967909, -5.596549966), (-118.067182683, -6.158566829))
            ThreePointArc((-118.067182683, -6.158566829), (-119.989357883, -9.092571086), (-118.074470332, -12.031336839))
            Line((-118.074470332, -12.031336839), (-116.782967909, -12.596549966))
            Line((-116.782967909, -12.596549966), (-116.782967909, -5.596549966))
        make_face()
        with BuildLine():
            Line((-65.492795381, -6.164378317), (-66.782994627, -5.596683168))
            Line((-66.782994627, -5.596683168), (-66.782967909, -12.596549966))
            Line((-66.782967909, -12.596549966), (-65.498754212, -12.031336314))
            ThreePointArc((-65.498754212, -12.031336314), (-63.579506477, -9.099803591), (-65.492795381, -6.164378317))
        make_face()
    extrude(amount=BOSS_EXTRUDE6_DEPTH)

    # Sketch12 → Boss-Extrude7 (add)
    # profile 1 of 2: a face of its own
    with BuildSketch(Plane(origin=(0, 5.403450034, 0), x_dir=(-1, 0, 0), z_dir=(0, -1, 0))):
        with Locations((45, -110.032967909)):
            Circle(SKETCH12_R)
        with Locations((45, -110.032967909)):
            Circle(SKETCH12_R_2, mode=Mode.SUBTRACT)
    # profile 2 of 2: a face of its own
    with BuildSketch(Plane(origin=(0, 5.403450034, 0), x_dir=(-1, 0, 0), z_dir=(0, -1, 0))):
        with Locations((45, -73.532967909)):
            Circle(SKETCH12_R_3)
        with Locations((45, -73.532967909)):
            Circle(SKETCH12_R_2, mode=Mode.SUBTRACT)
    extrude(amount=BOSS_EXTRUDE7_DEPTH)

    # Sketch13 → Cut-Extrude6 (cut)
    with BuildSketch(Plane(origin=(0, 5.403450034, 0), x_dir=(1, 0, 0), z_dir=(0, 1, 0))):
        with Locations(Location((-45, -91.782967909, 0), (0, 0, 270))):
            Circle(SKETCH13_R)
    extrude(amount=-CUT_EXTRUDE6_DEPTH, mode=Mode.SUBTRACT)


with BuildPart() as boss_extrude8_tool:
    # Sketch14 → Boss-Extrude8 (new body)
    with BuildSketch(Plane(origin=(0, 5.403450034, 0), x_dir=(1, 0, 0), z_dir=(0, 1, 0))):
        with Locations((-45, -110.032967909)):
            Circle(SKETCH14_R)
        with Locations((-45, -73.532967909)):
            Circle(SKETCH14_R)
    extrude(amount=-BOSS_EXTRUDE8_DEPTH)


with BuildPart() as part_1:
    add(part.part)


with BuildPart() as part_2:
    # Boss-Extrude8: joined with boss_extrude8_tool
    add(part_1.part.fuse(boss_extrude8_tool.part, tol=0.00001))

    # Sketch15 → Cut-Extrude7 (cut)
    with BuildSketch(Plane(origin=(0, 5.403450034, 0), x_dir=(1, 0, 0), z_dir=(0, 1, 0))):
        with Locations(Location((-45, -110.032967909, 0), (0, 0, 270))):
            Circle(SKETCH15_R)
        with Locations(Location((-45, -73.532967909, 0), (0, 0, 270))):
            Circle(SKETCH15_R)
    extrude(amount=-CUT_EXTRUDE7_DEPTH, mode=Mode.SUBTRACT)

    # Boss-Extrude11: read off the stored shape, not the designer's step
    # Boss-Extrude11 outline → Boss-Extrude11 (add)
    with BuildSketch(Plane.ZY.offset(90)):
        with BuildLine():
            ThreePointArc((65.492795381, -6.164378317), (63.579506477, -9.099803591), (65.498754212, -12.031336314))
            Line((65.498754212, -12.031336314), (66.782967909, -12.596549966))
            Line((66.782967909, -12.596549966), (116.782967909, -12.596549966))
            Line((116.782967909, -12.596549966), (118.074470332, -12.031336839))
            ThreePointArc((118.074470332, -12.031336839), (119.989357883, -9.092571086), (118.067182683, -6.158566829))
            Line((118.067182683, -6.158566829), (116.782967909, -5.596549966))
            Line((116.782967909, -5.596549966), (91.782967909, 5.403450034))
            Line((91.782967909, 5.403450034), (66.782967909, -5.596622445))
            Line((66.782967909, -5.596622445), (65.492795381, -6.164378317))
        make_face()
    extrude(amount=BOSS_EXTRUDE11_DEPTH)


solid = part_2.part
